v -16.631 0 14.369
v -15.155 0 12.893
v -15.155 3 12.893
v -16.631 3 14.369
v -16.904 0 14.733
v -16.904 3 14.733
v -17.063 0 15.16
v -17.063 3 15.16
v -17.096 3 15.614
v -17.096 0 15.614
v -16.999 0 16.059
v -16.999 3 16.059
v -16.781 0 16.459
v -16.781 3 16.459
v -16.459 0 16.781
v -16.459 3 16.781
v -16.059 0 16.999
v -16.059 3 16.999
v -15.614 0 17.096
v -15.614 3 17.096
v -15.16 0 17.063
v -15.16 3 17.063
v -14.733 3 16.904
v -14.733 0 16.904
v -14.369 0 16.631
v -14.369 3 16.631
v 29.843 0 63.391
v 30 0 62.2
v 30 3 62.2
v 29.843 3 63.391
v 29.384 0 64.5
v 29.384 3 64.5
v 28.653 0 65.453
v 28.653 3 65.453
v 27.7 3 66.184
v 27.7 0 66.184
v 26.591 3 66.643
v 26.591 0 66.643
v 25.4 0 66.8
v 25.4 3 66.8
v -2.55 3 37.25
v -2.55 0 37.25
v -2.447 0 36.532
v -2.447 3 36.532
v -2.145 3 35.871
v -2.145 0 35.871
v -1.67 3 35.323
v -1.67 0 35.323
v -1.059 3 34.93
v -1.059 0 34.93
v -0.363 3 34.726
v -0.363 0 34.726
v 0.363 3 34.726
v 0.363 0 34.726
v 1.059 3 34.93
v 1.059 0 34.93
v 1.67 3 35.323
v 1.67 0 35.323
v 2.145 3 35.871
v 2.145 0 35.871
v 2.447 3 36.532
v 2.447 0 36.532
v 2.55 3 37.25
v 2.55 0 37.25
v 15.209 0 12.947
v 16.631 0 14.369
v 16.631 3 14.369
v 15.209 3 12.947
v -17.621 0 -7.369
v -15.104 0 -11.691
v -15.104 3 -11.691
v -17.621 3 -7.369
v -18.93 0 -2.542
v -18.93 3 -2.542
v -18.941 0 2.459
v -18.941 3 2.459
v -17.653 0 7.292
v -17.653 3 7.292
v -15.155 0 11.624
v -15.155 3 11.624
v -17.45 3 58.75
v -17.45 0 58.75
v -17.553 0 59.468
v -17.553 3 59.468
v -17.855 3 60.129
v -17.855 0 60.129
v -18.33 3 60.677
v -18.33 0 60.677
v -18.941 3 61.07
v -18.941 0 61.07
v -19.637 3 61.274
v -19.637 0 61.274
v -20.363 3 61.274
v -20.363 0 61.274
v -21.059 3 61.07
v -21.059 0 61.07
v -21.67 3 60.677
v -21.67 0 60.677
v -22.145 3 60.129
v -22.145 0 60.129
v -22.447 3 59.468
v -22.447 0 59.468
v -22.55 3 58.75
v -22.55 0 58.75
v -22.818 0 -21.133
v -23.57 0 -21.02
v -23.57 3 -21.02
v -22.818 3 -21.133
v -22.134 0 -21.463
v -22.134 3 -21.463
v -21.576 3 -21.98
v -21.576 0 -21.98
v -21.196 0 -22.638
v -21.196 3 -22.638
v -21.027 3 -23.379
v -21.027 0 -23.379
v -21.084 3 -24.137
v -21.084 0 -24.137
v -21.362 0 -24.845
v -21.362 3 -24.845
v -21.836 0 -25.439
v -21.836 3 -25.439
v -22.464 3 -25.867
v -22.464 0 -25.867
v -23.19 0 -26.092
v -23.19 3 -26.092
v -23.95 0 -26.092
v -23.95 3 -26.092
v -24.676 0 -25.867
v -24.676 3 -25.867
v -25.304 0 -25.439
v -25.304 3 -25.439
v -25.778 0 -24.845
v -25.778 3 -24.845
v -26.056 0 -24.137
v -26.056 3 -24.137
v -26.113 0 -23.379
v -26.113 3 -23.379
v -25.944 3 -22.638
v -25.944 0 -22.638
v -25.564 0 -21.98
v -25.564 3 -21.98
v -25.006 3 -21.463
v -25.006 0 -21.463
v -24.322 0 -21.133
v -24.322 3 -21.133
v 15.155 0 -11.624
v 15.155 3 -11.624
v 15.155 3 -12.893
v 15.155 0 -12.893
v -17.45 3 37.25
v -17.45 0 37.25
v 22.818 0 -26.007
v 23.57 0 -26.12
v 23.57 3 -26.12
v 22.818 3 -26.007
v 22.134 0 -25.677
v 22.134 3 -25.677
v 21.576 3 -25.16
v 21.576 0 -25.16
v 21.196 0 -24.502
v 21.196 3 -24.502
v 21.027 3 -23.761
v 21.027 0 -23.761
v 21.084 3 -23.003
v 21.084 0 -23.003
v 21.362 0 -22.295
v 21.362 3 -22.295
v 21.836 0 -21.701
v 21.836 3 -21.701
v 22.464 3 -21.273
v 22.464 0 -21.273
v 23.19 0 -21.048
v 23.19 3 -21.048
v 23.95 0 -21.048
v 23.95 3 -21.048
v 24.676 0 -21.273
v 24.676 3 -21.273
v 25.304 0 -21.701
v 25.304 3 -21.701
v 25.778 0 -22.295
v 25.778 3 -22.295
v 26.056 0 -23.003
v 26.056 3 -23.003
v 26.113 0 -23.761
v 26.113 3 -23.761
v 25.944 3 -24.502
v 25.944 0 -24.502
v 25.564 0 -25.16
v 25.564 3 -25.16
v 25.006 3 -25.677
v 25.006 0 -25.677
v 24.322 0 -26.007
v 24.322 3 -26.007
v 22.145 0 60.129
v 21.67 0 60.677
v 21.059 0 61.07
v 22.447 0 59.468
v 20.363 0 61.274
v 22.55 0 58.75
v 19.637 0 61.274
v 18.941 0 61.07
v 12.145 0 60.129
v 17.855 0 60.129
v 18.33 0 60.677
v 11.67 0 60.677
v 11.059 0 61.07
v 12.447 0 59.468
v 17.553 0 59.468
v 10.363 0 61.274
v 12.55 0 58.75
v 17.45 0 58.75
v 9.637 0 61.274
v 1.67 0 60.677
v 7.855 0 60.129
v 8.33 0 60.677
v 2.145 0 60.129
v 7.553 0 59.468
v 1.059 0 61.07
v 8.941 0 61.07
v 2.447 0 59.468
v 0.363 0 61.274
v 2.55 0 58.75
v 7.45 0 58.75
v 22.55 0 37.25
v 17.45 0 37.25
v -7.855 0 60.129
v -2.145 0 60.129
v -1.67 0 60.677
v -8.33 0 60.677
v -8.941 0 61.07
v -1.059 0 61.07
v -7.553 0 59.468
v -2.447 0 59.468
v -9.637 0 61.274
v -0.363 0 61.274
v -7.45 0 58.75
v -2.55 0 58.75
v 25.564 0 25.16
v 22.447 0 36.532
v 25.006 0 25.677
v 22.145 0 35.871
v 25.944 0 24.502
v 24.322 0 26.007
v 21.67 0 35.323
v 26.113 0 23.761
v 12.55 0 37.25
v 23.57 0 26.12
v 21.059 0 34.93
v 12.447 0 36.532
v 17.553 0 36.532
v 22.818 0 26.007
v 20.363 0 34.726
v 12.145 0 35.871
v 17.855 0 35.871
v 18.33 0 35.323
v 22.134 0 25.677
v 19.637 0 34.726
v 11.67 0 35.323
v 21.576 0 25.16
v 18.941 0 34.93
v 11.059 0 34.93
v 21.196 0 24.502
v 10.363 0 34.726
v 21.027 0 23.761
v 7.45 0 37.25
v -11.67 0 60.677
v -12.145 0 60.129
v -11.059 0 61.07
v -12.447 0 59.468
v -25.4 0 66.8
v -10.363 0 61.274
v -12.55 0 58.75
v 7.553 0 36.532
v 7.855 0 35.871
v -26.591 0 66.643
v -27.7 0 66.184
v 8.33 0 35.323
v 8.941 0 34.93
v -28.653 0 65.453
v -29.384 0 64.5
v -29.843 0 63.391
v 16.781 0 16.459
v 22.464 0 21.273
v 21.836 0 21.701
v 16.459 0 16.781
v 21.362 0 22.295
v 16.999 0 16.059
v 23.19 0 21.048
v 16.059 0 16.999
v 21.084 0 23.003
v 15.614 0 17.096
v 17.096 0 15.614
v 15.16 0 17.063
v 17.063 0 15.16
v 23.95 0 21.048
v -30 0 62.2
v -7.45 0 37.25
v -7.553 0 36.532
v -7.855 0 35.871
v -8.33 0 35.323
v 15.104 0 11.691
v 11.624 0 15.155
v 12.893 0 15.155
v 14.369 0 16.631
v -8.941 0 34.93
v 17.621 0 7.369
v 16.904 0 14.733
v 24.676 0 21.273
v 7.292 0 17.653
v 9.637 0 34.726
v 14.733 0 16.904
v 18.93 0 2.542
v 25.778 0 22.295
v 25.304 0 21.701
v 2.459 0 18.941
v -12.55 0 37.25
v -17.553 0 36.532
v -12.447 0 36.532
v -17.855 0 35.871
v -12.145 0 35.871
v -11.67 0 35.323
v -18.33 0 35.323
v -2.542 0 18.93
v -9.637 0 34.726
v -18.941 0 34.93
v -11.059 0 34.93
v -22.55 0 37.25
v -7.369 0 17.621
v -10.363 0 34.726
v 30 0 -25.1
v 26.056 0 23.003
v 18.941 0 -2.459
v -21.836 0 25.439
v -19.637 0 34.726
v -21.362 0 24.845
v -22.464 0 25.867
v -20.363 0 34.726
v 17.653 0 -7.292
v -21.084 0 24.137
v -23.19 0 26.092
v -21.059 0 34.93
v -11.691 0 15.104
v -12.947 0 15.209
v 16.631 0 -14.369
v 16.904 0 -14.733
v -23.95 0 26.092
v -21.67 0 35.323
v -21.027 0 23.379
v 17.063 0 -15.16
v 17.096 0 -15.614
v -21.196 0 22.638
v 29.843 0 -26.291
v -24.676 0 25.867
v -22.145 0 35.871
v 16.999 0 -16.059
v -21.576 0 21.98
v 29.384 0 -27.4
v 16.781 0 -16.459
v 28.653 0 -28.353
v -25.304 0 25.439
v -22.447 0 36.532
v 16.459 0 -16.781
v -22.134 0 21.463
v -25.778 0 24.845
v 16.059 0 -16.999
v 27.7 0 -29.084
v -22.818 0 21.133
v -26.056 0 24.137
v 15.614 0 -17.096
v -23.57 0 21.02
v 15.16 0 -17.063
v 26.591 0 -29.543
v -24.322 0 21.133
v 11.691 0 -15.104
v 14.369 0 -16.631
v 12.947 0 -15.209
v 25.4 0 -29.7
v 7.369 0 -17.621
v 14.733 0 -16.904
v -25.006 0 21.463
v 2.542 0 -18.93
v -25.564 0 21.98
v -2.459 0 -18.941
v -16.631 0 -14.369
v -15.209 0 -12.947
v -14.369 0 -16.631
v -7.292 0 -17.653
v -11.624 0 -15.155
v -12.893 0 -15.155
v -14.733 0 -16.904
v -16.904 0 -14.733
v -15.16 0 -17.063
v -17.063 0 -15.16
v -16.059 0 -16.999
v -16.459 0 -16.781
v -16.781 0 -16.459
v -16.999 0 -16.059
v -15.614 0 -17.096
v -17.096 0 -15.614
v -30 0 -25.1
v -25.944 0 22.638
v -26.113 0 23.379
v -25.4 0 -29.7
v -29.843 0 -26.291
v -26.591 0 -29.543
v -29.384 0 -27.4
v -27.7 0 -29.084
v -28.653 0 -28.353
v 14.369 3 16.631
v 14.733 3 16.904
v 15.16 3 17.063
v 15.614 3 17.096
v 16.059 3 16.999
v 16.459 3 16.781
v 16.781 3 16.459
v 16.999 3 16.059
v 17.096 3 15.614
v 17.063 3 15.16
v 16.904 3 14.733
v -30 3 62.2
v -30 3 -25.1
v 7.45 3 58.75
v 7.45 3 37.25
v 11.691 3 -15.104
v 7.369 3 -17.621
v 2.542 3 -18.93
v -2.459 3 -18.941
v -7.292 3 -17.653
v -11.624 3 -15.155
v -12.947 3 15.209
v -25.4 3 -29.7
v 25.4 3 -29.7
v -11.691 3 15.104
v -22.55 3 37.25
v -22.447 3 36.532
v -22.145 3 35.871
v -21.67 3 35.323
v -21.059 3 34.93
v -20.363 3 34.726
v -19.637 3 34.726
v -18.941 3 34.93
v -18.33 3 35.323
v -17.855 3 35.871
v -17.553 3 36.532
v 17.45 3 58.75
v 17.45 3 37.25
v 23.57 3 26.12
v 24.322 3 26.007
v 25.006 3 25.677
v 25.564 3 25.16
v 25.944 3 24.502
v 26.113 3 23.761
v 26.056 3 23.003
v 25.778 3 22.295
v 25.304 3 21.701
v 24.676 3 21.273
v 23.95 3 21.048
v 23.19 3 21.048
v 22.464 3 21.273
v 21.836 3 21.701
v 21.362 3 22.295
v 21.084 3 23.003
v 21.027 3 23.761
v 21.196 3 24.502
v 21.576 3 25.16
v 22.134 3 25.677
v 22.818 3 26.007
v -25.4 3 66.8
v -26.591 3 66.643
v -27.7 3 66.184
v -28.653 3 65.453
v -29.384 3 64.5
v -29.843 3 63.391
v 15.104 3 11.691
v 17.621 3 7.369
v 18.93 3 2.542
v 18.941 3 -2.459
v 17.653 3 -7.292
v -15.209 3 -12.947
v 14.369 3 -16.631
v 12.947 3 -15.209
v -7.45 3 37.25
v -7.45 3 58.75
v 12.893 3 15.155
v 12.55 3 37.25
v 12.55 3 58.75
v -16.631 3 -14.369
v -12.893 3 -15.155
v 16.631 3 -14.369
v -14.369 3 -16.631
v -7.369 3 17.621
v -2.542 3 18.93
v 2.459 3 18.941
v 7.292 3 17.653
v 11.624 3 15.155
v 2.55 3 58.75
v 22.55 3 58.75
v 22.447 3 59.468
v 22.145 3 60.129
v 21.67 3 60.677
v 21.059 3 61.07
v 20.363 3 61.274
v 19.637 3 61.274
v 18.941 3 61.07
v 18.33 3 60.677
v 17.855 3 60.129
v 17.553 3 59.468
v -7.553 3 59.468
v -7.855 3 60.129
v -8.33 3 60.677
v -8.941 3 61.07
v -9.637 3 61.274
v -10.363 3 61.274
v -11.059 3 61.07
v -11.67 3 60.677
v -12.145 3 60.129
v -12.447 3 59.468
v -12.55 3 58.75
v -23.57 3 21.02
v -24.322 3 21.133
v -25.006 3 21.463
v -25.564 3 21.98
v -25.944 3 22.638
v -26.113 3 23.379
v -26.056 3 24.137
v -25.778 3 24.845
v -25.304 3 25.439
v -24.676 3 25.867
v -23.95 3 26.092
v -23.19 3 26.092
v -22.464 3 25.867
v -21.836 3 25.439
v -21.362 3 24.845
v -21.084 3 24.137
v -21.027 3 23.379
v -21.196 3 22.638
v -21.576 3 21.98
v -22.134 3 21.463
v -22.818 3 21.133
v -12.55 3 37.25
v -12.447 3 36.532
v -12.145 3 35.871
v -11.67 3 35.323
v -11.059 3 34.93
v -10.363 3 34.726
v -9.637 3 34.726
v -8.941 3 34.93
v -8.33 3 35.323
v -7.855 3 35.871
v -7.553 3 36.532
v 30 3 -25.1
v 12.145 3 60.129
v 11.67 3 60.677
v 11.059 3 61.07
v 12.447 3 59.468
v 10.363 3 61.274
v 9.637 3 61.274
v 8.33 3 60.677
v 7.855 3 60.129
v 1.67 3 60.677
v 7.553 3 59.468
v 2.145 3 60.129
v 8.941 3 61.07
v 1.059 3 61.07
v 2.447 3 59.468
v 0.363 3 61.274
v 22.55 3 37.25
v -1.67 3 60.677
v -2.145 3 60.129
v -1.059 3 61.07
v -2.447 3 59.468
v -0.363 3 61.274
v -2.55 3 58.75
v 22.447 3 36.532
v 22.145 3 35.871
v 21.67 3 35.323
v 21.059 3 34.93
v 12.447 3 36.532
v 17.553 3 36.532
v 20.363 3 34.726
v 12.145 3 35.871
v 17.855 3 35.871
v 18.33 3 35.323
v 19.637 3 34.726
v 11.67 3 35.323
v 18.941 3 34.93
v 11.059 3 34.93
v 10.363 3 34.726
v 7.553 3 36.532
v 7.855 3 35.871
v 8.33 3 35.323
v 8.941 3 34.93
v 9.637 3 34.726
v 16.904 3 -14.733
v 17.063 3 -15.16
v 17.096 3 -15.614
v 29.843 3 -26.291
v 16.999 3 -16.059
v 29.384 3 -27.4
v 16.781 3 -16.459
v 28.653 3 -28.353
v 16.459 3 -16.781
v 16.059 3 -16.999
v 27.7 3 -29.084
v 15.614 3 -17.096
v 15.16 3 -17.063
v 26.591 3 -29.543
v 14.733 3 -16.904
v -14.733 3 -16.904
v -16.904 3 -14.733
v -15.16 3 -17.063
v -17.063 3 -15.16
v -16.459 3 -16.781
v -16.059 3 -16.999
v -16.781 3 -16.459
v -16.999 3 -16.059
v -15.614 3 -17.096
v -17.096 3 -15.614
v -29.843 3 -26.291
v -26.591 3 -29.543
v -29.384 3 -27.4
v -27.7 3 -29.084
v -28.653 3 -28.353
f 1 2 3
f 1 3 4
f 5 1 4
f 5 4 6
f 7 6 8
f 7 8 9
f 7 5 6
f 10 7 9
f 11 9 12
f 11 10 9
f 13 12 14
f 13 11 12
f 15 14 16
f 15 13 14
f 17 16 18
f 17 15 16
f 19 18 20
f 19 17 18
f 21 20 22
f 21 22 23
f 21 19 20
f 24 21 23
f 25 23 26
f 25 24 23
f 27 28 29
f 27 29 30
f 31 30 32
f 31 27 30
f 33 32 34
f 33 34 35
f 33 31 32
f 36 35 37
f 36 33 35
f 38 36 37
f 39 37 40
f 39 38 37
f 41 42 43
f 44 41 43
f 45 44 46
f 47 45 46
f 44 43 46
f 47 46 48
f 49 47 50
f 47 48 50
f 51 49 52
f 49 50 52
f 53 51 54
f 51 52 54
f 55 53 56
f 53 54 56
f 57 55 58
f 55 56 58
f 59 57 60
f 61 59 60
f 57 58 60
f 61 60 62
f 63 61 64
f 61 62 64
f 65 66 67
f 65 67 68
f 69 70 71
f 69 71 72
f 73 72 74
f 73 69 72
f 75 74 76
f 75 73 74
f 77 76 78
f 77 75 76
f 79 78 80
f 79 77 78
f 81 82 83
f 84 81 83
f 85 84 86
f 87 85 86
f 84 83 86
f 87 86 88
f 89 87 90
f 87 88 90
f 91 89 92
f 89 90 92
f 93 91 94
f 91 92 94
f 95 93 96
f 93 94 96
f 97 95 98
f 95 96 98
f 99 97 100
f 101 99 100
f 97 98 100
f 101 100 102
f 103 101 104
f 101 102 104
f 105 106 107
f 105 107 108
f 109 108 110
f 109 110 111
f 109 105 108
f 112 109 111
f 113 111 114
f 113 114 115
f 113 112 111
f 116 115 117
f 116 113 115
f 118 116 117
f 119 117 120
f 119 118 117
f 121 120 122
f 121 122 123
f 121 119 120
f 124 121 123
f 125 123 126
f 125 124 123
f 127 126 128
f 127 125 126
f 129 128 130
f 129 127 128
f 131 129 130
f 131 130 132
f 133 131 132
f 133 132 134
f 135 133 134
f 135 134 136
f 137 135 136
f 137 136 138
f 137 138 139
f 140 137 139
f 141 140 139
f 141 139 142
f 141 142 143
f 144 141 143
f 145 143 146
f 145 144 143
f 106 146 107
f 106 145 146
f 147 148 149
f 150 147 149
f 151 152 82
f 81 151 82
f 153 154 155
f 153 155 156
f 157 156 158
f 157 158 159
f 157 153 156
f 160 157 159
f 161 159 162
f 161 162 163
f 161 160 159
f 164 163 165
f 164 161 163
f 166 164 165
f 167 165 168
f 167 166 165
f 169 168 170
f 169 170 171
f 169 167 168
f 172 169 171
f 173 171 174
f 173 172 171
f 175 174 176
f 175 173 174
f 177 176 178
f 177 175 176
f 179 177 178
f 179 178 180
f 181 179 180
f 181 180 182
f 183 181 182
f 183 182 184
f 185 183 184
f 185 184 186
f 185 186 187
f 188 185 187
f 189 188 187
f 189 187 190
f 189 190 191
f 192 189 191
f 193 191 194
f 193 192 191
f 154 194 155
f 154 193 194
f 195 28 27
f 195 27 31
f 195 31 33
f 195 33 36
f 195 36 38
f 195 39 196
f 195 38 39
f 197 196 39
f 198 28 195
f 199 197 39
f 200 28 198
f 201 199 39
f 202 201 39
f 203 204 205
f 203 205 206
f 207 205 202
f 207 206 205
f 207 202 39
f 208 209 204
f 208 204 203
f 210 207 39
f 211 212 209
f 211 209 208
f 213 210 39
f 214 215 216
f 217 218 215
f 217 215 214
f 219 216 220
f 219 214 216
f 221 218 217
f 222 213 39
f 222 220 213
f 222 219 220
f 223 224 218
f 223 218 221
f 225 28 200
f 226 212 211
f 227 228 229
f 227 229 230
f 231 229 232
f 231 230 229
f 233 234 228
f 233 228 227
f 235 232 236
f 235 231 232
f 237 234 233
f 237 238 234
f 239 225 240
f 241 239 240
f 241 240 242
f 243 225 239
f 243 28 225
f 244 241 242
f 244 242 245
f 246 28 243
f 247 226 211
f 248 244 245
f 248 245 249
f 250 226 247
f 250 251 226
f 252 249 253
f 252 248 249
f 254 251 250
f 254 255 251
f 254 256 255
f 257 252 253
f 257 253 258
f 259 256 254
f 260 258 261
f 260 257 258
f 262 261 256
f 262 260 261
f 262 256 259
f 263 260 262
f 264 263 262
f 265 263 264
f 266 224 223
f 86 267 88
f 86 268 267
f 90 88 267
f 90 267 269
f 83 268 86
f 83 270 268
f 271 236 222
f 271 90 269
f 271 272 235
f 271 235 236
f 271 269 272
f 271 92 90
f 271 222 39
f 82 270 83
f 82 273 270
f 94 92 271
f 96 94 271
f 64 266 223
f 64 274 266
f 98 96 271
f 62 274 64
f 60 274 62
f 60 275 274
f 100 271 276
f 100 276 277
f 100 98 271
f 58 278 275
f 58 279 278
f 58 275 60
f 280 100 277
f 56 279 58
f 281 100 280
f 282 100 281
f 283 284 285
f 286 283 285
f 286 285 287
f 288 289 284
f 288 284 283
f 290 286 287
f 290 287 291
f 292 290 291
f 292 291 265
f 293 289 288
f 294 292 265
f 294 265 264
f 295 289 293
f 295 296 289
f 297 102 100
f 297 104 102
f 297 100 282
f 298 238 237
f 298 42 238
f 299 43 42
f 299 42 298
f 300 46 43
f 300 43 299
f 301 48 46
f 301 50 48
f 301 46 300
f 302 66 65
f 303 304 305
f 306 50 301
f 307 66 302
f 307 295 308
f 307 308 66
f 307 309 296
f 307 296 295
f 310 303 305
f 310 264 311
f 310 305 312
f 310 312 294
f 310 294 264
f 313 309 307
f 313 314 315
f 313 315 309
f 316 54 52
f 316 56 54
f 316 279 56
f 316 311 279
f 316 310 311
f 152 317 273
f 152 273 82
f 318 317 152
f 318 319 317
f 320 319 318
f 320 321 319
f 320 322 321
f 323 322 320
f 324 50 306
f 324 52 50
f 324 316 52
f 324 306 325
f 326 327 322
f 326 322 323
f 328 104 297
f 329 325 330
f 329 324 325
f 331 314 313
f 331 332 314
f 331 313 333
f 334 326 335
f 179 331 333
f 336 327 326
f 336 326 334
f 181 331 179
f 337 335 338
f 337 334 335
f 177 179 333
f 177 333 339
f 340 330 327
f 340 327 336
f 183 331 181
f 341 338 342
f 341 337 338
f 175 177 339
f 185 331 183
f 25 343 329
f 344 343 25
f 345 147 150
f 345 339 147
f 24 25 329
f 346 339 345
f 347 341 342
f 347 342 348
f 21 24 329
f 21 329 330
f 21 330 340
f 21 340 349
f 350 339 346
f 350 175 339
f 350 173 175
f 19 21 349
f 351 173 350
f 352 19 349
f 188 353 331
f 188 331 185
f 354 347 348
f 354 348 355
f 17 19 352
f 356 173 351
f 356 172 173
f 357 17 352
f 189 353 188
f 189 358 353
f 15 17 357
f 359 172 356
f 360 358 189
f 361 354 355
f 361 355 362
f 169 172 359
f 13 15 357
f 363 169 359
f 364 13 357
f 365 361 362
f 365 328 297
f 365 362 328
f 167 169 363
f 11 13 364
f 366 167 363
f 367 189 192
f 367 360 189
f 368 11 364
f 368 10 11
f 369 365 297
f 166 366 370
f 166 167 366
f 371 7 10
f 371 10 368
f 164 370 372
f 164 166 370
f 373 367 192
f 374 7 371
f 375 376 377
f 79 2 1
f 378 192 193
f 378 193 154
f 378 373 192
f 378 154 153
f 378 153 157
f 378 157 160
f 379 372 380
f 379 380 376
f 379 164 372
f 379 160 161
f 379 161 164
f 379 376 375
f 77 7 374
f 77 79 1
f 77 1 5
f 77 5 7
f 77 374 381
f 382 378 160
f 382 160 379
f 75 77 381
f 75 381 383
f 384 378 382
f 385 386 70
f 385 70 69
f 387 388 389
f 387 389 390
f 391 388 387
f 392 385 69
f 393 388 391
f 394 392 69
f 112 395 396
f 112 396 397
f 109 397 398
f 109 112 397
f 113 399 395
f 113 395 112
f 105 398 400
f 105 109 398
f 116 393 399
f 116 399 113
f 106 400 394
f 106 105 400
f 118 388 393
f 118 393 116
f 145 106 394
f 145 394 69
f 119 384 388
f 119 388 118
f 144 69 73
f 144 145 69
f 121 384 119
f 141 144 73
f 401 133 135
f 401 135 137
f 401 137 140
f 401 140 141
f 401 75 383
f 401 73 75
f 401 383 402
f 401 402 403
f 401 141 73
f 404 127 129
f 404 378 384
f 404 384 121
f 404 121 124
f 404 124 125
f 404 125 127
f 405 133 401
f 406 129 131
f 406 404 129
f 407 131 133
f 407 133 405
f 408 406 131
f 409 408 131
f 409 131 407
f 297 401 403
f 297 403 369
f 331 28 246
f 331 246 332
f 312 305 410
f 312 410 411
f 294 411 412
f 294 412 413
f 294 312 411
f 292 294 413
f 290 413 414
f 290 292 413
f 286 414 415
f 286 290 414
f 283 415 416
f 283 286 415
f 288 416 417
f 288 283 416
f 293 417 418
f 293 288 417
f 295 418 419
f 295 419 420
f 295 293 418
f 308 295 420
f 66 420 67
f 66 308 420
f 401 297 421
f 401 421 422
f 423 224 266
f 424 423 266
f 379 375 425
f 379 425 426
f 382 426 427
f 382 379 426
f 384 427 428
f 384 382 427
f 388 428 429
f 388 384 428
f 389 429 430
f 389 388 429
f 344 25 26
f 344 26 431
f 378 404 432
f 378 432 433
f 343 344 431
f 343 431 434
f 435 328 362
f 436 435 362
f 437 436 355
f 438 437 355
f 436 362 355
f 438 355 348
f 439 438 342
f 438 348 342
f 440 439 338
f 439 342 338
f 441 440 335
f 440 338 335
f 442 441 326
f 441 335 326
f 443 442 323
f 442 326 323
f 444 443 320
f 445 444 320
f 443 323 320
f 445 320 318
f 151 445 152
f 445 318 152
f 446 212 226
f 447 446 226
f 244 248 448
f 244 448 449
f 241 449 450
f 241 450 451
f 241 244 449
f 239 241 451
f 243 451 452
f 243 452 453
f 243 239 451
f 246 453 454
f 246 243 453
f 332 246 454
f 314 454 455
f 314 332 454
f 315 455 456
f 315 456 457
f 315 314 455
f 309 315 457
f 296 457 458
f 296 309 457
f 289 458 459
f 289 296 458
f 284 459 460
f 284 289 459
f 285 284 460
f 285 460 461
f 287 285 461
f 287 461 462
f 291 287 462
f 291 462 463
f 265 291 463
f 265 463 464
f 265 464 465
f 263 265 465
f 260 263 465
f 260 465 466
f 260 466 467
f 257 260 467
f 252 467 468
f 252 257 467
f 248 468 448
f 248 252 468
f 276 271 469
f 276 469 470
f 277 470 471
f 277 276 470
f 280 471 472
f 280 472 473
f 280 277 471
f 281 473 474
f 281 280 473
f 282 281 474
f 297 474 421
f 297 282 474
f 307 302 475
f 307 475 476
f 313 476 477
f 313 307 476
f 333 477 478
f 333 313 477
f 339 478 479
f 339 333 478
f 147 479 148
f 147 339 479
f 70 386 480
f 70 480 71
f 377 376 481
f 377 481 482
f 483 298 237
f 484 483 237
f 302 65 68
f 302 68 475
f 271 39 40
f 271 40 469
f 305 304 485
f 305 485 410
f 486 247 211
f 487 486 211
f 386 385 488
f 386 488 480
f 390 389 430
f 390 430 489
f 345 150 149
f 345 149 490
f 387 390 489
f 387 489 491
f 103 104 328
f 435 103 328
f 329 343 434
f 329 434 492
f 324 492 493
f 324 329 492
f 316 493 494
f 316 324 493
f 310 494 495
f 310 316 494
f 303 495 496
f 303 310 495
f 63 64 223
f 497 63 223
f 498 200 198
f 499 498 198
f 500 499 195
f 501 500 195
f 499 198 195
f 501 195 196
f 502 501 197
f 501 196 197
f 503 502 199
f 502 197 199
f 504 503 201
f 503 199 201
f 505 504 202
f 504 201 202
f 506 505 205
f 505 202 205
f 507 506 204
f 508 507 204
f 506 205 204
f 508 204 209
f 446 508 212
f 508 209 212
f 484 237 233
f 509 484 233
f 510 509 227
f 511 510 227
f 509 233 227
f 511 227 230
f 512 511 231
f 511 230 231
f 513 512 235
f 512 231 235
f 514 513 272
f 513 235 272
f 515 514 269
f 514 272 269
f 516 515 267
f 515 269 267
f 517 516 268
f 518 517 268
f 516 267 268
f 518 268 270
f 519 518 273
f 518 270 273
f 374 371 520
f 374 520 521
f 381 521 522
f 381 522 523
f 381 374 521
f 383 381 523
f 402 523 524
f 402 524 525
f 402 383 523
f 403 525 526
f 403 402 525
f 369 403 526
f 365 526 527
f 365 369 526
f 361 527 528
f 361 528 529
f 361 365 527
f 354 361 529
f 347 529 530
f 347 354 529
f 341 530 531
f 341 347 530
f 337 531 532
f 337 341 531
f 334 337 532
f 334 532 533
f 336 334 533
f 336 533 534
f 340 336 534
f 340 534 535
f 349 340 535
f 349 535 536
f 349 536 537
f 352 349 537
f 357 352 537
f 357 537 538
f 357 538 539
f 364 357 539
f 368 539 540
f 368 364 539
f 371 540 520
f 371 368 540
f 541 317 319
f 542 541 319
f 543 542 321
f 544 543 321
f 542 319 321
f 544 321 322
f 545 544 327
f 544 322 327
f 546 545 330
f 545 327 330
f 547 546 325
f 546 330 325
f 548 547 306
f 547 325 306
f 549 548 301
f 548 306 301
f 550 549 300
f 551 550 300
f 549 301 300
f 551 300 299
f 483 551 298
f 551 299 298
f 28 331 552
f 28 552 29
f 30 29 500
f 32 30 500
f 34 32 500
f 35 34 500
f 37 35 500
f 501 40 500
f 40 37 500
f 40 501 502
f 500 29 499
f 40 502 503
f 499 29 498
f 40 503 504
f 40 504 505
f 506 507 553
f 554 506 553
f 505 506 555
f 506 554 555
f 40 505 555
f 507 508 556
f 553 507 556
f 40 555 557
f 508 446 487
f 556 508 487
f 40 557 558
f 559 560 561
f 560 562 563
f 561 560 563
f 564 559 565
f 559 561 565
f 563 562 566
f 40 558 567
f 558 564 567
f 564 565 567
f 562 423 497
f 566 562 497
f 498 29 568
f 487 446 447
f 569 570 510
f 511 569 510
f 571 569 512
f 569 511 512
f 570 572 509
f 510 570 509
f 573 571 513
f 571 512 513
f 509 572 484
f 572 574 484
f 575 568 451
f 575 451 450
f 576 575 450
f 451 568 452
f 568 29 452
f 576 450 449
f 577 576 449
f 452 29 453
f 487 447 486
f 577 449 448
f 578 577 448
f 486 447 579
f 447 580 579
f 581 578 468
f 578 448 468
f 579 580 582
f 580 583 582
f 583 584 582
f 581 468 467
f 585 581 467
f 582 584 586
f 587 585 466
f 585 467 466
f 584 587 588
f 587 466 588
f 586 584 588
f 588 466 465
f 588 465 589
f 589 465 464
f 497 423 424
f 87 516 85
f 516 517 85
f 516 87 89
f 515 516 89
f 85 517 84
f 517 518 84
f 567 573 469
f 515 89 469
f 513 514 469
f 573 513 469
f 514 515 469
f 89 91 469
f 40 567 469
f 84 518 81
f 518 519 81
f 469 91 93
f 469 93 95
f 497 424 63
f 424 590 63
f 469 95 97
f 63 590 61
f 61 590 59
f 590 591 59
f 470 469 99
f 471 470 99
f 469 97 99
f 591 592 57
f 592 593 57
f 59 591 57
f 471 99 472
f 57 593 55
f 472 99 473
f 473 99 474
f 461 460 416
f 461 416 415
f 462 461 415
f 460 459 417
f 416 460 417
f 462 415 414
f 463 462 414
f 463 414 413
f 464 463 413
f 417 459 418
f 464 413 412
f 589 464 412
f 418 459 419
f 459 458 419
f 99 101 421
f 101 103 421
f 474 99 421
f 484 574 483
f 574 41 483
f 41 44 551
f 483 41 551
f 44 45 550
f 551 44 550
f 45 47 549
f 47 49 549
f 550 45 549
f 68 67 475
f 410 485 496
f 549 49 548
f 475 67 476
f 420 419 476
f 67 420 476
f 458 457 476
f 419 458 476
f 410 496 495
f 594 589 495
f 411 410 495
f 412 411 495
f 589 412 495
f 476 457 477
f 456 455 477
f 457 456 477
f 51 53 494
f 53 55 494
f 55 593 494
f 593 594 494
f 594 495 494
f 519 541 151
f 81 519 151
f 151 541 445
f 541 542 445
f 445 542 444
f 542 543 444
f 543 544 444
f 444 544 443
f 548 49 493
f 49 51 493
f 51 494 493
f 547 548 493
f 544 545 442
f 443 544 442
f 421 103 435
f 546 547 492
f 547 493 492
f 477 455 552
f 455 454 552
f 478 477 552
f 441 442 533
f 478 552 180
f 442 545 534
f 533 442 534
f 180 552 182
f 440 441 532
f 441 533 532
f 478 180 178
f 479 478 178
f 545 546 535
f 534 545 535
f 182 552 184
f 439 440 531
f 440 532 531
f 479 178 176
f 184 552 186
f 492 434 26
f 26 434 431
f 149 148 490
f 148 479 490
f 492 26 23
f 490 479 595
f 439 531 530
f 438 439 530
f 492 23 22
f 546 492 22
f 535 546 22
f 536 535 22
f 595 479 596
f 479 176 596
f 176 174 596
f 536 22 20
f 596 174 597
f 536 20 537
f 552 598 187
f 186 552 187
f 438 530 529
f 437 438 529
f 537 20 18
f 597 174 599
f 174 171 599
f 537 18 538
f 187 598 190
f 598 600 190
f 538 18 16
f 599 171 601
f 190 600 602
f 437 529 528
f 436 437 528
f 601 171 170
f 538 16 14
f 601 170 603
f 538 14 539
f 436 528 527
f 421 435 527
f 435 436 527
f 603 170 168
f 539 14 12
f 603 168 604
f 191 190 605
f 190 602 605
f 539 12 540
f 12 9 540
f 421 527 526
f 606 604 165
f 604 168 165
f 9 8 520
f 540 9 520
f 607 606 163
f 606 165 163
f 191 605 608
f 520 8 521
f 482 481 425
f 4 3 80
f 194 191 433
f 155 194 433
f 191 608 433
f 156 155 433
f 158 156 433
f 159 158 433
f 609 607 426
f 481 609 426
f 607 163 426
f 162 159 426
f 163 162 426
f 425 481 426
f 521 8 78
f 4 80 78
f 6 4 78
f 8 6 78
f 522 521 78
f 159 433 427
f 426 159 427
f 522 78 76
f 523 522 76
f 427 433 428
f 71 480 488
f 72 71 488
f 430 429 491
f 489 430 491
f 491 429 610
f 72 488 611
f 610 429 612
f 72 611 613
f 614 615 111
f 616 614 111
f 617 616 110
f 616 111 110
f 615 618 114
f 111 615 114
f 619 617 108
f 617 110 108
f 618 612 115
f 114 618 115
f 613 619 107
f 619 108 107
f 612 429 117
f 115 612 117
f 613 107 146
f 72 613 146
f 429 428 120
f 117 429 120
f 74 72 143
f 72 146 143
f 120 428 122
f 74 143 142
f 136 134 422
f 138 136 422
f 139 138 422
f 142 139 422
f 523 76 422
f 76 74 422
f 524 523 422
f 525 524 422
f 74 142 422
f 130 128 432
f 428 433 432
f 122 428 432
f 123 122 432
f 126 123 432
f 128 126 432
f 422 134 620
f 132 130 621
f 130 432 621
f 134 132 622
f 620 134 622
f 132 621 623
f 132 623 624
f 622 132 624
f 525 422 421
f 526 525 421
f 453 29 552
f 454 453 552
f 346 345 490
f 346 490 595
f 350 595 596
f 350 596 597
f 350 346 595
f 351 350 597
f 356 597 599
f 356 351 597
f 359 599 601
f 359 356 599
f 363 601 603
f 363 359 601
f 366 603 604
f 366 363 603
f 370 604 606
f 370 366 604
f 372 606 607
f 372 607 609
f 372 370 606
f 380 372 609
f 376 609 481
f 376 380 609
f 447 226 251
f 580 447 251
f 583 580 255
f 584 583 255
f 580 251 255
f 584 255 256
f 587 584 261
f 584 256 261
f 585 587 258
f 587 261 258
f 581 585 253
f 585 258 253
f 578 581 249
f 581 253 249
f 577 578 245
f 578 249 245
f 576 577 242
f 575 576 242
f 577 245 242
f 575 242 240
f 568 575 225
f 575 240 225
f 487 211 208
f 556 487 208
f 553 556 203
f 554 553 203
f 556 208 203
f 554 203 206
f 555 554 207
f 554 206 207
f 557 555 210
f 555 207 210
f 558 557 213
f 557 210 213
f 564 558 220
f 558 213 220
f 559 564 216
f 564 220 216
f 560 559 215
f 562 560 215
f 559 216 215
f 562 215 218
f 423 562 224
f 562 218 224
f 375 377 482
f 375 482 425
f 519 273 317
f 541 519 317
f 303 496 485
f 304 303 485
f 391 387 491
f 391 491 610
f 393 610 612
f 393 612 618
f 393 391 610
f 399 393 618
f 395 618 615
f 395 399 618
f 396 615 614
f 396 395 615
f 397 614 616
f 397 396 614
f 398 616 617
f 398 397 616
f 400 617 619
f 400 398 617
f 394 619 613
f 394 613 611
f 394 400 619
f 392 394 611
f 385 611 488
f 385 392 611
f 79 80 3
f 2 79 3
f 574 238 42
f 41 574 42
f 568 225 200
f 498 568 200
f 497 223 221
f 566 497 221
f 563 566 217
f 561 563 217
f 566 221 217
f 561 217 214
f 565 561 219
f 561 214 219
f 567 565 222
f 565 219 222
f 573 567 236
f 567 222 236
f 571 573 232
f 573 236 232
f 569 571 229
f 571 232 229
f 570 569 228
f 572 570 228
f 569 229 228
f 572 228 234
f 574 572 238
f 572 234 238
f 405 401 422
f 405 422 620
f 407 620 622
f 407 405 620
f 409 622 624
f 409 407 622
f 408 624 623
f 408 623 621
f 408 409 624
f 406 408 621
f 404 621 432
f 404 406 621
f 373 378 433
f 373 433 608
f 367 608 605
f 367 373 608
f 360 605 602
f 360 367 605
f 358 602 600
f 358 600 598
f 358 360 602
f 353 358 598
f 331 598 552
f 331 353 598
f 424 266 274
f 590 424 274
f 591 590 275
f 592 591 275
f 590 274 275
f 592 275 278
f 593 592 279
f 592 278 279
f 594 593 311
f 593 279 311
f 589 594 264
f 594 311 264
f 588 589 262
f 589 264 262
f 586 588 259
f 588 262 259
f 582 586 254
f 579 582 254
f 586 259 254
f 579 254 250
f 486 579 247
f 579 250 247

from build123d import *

# Parameters (mm, degrees)
SKETCH1_R           = 2.55
BOSS_EXTRUDE1_DEPTH = 3
CHAMFER1_SIZE       = 0.876505316
CHAMFER1_SIZE_2     = 0.8


with BuildPart() as part:
    # Sketch1 → Boss-Extrude1 (new body)
    with BuildSketch(Plane(origin=(0, 0, 0), x_dir=(1, 0, 0), z_dir=(0, 1, 0))):
        with BuildLine():
            Line((25.4, -66.8), (-25.4, -66.8))
            ThreePointArc((-25.4, -66.8), (-28.652691193, -65.452691193), (-30, -62.2))
            Line((-30, -62.2), (-30, 25.1))
            ThreePointArc((-30, 25.1), (-28.652691193, 28.352691193), (-25.4, 29.7))
            Line((-25.4, 29.7), (25.4, 29.7))
            ThreePointArc((25.4, 29.7), (28.652691193, 28.352691193), (30, 25.1))
            Line((30, 25.1), (30, -62.2))
            ThreePointArc((30, -62.2), (28.652691193, -65.452691193), (25.4, -66.8))
        make_face()
        with Locations(Location((-23.57, 23.57, 0), (0, 0, 270))):
            Circle(SKETCH1_R, mode=Mode.SUBTRACT)
        with Locations(Location((23.57, 23.57, 0), (0, 0, 90))):
            Circle(SKETCH1_R, mode=Mode.SUBTRACT)
        with Locations(Location((23.57, -23.57, 0), (0, 0, 270))):
            Circle(SKETCH1_R, mode=Mode.SUBTRACT)
        with Locations(Location((-23.57, -23.57, 0), (0, 0, 90))):
            Circle(SKETCH1_R, mode=Mode.SUBTRACT)
        with BuildLine():
            Line((17.45, -58.75), (17.45, -37.25))
            ThreePointArc((17.45, -37.25), (20, -34.7), (22.55, -37.25))
            Line((22.55, -37.25), (22.55, -58.75))
            ThreePointArc((22.55, -58.75), (20, -61.3), (17.45, -58.75))
        make_face(mode=Mode.SUBTRACT)
        with BuildLine():
            Line((7.45, -58.75), (7.45, -37.25))
            ThreePointArc((7.45, -37.25), (10, -34.7), (12.55, -37.25))
            Line((12.55, -37.25), (12.55, -58.75))
            ThreePointArc((12.55, -58.75), (10, -61.3), (7.45, -58.75))
        make_face(mode=Mode.SUBTRACT)
        with BuildLine():
            Line((-2.55, -58.75), (-2.55, -37.25))
            ThreePointArc((-2.55, -37.25), (0, -34.7), (2.55, -37.25))
            Line((2.55, -37.25), (2.55, -58.75))
            ThreePointArc((2.55, -58.75), (0, -61.3), (-2.55, -58.75))
        make_face(mode=Mode.SUBTRACT)
        with BuildLine():
            Line((-12.55, -58.75), (-12.55, -37.25))
            ThreePointArc((-12.55, -37.25), (-10, -34.7), (-7.45, -37.25))
            Line((-7.45, -37.25), (-7.45, -58.75))
            ThreePointArc((-7.45, -58.75), (-10, -61.3), (-12.55, -58.75))
        make_face(mode=Mode.SUBTRACT)
        with BuildLine():
            Line((-22.55, -58.75), (-22.55, -37.25))
            ThreePointArc((-22.55, -37.25), (-20, -34.7), (-17.45, -37.25))
            Line((-17.45, -37.25), (-17.45, -58.75))
            ThreePointArc((-17.45, -58.75), (-20, -61.3), (-22.55, -58.75))
        make_face(mode=Mode.SUBTRACT)
        with BuildLine():
            Line((14.36862915, 16.63137085), (12.326897984, 14.589639684))
            ThreePointArc((12.326897984, 14.589639684), (0, 19.1), (-12.326897984, 14.589639684))
            Line((-12.326897984, 14.589639684), (-14.36862915, 16.63137085))
            ThreePointArc((-14.36862915, 16.63137085), (-16.63137085, 16.63137085), (-16.63137085, 14.36862915))
            Line((-16.63137085, 14.36862915), (-14.589639684, 12.326897984))
            ThreePointArc((-14.589639684, 12.326897984), (-19.1, 0), (-14.589639684, -12.326897984))
            Line((-14.589639684, -12.326897984), (-16.63137085, -14.36862915))
            ThreePointArc((-16.63137085, -14.36862915), (-16.63137085, -16.63137085), (-14.36862915, -16.63137085))
            Line((-14.36862915, -16.63137085), (-12.326897984, -14.589639684))
            ThreePointArc((-12.326897984, -14.589639684), (0, -19.1), (12.326897984, -14.589639684))
            Line((12.326897984, -14.589639684), (14.36862915, -16.63137085))
            ThreePointArc((14.36862915, -16.63137085), (16.63137085, -16.63137085), (16.63137085, -14.36862915))
            Line((16.63137085, -14.36862915), (14.589639684, -12.326897984))
            ThreePointArc((14.589639684, -12.326897984), (19.1, 0), (14.589639684, 12.326897984))
            Line((14.589639684, 12.326897984), (16.63137085, 14.36862915))
            ThreePointArc((16.63137085, 14.36862915), (16.63137085, 16.63137085), (14.36862915, 16.63137085))
        make_face(mode=Mode.SUBTRACT)
    extrude(amount=BOSS_EXTRUDE1_DEPTH)

    # Chamfer1
    # the kernel refuses this chamfer: 0.876505316, 0.8 mm, written as the material it takes off along each edge
    with BuildSketch(Plane(origin=(-14.589639684, -2.258924043, -12.326897984), x_dir=(-0.7071067811865476, 0, -0.7071067811865476), z_dir=(0, 1, 0)), Plane(origin=(-12.326897984, -2.258924043, 14.589639684), x_dir=(-0.7071067811865435, 0, 0.7071067811865516), z_dir=(0, 1, 0)), Plane(origin=(14.589639684, -2.258924043, 12.326897984), x_dir=(0.7071067811865475, 0, 0.7071067811865475), z_dir=(0, 1, 0)), Plane(origin=(12.326897984, -2.258924043, -14.589639684), x_dir=(0.7071067811865465, 0, -0.7071067811865486), z_dir=(0, 1, 0))) as chamfer1_piece_1:
        with BuildLine():
            Line((CHAMFER1_SIZE, 0), (-0.085923492, 0.81316345))
            ThreePointArc((-0.085923492, 0.81316345), (-0.039945159, 0.419640102), (0, 0))
            Line((0, 0), (CHAMFER1_SIZE, 0))
        make_face()
    extrude(amount=7.517848085, mode=Mode.SUBTRACT)
    with BuildSketch(Plane(origin=(-14.589639684, -2.323826689, 12.326897984), x_dir=(-0.6271715557767805, 0, -0.7788811460194248), z_dir=(0, 1, 0)), Plane(origin=(12.326897984, -2.323826689, 14.589639684), x_dir=(-0.7788811460194289, 0, 0.6271715557767755), z_dir=(0, 1, 0)), Plane(origin=(14.589639684, -2.323826689, -12.326897984), x_dir=(0.6271715557767805, 0, 0.7788811460194248), z_dir=(0, 1, 0)), Plane(origin=(-12.326897984, -2.323826689, -14.589639684), x_dir=(0.7788811460194278, 0, -0.6271715557767769), z_dir=(0, 1, 0))) as chamfer1_piece_2:
        with BuildLine():
            Line((0.90196282, 0), (-CHAMFER1_SIZE_2 * 0.107274880032, CHAMFER1_SIZE_2 * 0.994229400146))
            Line((-CHAMFER1_SIZE_2 * 0.107274880032, CHAMFER1_SIZE_2 * 0.994229400146), (0, 0))
            ThreePointArc((0, 0), (0.464646952, 0.005320048), (0.90196282, 0))
        make_face()
    extrude(amount=7.647653377, mode=Mode.SUBTRACT)


solid = part.part
